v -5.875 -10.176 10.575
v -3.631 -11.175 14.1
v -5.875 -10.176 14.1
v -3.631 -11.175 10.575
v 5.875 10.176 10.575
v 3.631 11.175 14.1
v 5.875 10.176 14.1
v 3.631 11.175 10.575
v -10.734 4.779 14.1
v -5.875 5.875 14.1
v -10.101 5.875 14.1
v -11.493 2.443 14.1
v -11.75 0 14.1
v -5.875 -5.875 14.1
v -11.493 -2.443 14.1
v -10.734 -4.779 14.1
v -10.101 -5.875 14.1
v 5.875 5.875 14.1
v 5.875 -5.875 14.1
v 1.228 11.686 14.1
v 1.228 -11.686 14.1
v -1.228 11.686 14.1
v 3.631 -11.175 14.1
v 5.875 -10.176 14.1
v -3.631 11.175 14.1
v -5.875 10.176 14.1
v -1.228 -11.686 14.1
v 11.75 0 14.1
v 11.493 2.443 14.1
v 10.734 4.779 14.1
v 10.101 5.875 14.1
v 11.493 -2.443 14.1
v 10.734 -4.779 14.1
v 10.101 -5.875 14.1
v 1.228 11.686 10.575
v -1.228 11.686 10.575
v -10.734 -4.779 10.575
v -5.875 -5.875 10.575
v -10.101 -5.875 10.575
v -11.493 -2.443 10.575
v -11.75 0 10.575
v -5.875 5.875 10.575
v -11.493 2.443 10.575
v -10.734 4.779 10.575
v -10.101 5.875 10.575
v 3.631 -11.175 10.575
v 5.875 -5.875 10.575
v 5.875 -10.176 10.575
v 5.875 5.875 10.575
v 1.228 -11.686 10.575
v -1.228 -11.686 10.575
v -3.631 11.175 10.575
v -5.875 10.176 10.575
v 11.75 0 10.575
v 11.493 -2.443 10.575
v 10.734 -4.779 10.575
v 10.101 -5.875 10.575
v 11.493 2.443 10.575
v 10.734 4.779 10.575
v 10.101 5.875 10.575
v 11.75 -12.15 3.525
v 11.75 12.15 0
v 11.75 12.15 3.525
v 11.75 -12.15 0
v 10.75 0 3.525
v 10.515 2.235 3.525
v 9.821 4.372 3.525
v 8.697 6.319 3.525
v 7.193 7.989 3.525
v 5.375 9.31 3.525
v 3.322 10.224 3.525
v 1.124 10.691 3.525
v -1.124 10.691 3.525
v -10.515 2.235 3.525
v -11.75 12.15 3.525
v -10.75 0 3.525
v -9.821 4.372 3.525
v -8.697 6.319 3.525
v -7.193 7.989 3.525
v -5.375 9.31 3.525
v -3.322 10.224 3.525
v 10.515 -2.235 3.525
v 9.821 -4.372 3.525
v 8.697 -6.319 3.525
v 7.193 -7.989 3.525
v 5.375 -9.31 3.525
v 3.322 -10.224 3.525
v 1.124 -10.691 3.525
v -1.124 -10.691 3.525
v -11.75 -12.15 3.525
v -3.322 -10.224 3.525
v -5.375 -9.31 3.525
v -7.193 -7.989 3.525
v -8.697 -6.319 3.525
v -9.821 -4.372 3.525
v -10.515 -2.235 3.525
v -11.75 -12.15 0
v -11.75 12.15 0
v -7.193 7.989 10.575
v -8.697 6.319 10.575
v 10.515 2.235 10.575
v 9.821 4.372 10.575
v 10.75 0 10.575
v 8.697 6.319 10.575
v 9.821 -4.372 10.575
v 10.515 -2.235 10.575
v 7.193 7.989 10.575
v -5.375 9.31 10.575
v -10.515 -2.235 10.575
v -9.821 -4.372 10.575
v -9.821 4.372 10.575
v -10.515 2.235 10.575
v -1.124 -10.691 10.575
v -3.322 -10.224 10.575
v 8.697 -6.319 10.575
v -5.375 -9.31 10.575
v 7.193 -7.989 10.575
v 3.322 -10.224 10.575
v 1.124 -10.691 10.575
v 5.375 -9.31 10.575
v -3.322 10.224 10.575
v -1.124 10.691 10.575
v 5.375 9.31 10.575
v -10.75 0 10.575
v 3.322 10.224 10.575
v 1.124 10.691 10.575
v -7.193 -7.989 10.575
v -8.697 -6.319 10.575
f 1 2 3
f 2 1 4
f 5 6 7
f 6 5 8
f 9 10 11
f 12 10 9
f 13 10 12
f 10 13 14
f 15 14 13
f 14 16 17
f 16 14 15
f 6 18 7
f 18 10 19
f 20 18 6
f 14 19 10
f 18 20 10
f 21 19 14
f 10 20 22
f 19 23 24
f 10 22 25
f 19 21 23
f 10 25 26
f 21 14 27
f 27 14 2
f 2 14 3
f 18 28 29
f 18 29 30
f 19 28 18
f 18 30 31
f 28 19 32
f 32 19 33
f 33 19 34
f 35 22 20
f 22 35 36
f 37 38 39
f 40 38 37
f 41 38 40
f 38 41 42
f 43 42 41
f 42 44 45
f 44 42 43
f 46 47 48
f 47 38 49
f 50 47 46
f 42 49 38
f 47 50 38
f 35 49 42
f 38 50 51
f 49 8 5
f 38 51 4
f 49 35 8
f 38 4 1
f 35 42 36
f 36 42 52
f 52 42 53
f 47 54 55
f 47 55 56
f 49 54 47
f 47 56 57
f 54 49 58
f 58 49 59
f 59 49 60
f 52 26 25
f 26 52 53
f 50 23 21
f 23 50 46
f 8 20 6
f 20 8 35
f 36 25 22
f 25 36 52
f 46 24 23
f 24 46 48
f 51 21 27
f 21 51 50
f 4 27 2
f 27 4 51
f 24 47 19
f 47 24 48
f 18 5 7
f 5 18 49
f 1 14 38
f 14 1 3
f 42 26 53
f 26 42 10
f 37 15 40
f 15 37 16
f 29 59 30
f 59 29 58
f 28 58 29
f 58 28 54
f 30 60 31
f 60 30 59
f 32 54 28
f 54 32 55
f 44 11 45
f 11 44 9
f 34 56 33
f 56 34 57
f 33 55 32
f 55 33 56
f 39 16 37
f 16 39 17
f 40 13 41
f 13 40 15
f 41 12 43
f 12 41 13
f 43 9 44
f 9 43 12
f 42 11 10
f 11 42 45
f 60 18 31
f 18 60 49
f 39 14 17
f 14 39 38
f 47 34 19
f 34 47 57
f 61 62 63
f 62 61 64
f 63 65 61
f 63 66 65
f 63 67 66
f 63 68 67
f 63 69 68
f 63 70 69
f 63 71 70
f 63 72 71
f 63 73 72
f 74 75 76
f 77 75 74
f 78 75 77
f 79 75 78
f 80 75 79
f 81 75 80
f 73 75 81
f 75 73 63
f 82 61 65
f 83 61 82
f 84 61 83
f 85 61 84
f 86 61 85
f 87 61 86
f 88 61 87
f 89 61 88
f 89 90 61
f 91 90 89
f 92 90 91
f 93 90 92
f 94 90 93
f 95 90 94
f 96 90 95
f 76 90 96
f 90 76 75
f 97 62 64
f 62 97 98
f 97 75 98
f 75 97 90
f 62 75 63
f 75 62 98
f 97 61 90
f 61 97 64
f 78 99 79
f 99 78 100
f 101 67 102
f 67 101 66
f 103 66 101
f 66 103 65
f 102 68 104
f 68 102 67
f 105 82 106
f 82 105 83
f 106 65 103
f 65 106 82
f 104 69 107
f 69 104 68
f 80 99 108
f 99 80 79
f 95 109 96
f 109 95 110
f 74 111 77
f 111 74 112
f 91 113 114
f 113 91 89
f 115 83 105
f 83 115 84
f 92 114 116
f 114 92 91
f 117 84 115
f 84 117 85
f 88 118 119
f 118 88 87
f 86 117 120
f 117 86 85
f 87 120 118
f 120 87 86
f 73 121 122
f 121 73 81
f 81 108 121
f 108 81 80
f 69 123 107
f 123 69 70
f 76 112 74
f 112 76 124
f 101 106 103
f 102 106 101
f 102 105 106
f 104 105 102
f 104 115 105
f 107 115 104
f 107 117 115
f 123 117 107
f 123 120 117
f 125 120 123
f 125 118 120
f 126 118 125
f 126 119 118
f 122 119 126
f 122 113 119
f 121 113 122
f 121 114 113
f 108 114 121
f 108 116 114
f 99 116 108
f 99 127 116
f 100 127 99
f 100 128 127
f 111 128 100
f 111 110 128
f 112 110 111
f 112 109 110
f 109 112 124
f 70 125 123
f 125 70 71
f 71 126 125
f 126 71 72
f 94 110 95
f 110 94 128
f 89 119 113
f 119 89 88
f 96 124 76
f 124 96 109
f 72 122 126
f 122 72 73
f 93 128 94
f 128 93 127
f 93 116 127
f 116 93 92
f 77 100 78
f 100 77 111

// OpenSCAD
// L_23X24.3mm_H14mm

h=14.1;
l=23.5;
w=24.3;

group(){
translate([-l/2,-w/2,0])color("grey")cube([l,w, h/4]);
translate([0,0,h/4])color("gold")cylinder(r=l/2-1,h=h/2);
translate([-l/2,-w/2,0])color("gold")cube([2,w,1]); 
translate([l/2-2,-w/2,0])color("gold")cube([2,w,1]); 

translate([0,0,3/4*h]) {
intersection() {
color("grey")cylinder(r=l/2,h=h/4);
translate([-l/4,-l/2,0])color("grey")cube([l/2,l,h/4]);
}
intersection() {
color("grey")cylinder(r=l/2,h=h/4);
translate([-l/2,-l/4,0])color("grey")cube([l,l/2,h/4]);
}
}
}
